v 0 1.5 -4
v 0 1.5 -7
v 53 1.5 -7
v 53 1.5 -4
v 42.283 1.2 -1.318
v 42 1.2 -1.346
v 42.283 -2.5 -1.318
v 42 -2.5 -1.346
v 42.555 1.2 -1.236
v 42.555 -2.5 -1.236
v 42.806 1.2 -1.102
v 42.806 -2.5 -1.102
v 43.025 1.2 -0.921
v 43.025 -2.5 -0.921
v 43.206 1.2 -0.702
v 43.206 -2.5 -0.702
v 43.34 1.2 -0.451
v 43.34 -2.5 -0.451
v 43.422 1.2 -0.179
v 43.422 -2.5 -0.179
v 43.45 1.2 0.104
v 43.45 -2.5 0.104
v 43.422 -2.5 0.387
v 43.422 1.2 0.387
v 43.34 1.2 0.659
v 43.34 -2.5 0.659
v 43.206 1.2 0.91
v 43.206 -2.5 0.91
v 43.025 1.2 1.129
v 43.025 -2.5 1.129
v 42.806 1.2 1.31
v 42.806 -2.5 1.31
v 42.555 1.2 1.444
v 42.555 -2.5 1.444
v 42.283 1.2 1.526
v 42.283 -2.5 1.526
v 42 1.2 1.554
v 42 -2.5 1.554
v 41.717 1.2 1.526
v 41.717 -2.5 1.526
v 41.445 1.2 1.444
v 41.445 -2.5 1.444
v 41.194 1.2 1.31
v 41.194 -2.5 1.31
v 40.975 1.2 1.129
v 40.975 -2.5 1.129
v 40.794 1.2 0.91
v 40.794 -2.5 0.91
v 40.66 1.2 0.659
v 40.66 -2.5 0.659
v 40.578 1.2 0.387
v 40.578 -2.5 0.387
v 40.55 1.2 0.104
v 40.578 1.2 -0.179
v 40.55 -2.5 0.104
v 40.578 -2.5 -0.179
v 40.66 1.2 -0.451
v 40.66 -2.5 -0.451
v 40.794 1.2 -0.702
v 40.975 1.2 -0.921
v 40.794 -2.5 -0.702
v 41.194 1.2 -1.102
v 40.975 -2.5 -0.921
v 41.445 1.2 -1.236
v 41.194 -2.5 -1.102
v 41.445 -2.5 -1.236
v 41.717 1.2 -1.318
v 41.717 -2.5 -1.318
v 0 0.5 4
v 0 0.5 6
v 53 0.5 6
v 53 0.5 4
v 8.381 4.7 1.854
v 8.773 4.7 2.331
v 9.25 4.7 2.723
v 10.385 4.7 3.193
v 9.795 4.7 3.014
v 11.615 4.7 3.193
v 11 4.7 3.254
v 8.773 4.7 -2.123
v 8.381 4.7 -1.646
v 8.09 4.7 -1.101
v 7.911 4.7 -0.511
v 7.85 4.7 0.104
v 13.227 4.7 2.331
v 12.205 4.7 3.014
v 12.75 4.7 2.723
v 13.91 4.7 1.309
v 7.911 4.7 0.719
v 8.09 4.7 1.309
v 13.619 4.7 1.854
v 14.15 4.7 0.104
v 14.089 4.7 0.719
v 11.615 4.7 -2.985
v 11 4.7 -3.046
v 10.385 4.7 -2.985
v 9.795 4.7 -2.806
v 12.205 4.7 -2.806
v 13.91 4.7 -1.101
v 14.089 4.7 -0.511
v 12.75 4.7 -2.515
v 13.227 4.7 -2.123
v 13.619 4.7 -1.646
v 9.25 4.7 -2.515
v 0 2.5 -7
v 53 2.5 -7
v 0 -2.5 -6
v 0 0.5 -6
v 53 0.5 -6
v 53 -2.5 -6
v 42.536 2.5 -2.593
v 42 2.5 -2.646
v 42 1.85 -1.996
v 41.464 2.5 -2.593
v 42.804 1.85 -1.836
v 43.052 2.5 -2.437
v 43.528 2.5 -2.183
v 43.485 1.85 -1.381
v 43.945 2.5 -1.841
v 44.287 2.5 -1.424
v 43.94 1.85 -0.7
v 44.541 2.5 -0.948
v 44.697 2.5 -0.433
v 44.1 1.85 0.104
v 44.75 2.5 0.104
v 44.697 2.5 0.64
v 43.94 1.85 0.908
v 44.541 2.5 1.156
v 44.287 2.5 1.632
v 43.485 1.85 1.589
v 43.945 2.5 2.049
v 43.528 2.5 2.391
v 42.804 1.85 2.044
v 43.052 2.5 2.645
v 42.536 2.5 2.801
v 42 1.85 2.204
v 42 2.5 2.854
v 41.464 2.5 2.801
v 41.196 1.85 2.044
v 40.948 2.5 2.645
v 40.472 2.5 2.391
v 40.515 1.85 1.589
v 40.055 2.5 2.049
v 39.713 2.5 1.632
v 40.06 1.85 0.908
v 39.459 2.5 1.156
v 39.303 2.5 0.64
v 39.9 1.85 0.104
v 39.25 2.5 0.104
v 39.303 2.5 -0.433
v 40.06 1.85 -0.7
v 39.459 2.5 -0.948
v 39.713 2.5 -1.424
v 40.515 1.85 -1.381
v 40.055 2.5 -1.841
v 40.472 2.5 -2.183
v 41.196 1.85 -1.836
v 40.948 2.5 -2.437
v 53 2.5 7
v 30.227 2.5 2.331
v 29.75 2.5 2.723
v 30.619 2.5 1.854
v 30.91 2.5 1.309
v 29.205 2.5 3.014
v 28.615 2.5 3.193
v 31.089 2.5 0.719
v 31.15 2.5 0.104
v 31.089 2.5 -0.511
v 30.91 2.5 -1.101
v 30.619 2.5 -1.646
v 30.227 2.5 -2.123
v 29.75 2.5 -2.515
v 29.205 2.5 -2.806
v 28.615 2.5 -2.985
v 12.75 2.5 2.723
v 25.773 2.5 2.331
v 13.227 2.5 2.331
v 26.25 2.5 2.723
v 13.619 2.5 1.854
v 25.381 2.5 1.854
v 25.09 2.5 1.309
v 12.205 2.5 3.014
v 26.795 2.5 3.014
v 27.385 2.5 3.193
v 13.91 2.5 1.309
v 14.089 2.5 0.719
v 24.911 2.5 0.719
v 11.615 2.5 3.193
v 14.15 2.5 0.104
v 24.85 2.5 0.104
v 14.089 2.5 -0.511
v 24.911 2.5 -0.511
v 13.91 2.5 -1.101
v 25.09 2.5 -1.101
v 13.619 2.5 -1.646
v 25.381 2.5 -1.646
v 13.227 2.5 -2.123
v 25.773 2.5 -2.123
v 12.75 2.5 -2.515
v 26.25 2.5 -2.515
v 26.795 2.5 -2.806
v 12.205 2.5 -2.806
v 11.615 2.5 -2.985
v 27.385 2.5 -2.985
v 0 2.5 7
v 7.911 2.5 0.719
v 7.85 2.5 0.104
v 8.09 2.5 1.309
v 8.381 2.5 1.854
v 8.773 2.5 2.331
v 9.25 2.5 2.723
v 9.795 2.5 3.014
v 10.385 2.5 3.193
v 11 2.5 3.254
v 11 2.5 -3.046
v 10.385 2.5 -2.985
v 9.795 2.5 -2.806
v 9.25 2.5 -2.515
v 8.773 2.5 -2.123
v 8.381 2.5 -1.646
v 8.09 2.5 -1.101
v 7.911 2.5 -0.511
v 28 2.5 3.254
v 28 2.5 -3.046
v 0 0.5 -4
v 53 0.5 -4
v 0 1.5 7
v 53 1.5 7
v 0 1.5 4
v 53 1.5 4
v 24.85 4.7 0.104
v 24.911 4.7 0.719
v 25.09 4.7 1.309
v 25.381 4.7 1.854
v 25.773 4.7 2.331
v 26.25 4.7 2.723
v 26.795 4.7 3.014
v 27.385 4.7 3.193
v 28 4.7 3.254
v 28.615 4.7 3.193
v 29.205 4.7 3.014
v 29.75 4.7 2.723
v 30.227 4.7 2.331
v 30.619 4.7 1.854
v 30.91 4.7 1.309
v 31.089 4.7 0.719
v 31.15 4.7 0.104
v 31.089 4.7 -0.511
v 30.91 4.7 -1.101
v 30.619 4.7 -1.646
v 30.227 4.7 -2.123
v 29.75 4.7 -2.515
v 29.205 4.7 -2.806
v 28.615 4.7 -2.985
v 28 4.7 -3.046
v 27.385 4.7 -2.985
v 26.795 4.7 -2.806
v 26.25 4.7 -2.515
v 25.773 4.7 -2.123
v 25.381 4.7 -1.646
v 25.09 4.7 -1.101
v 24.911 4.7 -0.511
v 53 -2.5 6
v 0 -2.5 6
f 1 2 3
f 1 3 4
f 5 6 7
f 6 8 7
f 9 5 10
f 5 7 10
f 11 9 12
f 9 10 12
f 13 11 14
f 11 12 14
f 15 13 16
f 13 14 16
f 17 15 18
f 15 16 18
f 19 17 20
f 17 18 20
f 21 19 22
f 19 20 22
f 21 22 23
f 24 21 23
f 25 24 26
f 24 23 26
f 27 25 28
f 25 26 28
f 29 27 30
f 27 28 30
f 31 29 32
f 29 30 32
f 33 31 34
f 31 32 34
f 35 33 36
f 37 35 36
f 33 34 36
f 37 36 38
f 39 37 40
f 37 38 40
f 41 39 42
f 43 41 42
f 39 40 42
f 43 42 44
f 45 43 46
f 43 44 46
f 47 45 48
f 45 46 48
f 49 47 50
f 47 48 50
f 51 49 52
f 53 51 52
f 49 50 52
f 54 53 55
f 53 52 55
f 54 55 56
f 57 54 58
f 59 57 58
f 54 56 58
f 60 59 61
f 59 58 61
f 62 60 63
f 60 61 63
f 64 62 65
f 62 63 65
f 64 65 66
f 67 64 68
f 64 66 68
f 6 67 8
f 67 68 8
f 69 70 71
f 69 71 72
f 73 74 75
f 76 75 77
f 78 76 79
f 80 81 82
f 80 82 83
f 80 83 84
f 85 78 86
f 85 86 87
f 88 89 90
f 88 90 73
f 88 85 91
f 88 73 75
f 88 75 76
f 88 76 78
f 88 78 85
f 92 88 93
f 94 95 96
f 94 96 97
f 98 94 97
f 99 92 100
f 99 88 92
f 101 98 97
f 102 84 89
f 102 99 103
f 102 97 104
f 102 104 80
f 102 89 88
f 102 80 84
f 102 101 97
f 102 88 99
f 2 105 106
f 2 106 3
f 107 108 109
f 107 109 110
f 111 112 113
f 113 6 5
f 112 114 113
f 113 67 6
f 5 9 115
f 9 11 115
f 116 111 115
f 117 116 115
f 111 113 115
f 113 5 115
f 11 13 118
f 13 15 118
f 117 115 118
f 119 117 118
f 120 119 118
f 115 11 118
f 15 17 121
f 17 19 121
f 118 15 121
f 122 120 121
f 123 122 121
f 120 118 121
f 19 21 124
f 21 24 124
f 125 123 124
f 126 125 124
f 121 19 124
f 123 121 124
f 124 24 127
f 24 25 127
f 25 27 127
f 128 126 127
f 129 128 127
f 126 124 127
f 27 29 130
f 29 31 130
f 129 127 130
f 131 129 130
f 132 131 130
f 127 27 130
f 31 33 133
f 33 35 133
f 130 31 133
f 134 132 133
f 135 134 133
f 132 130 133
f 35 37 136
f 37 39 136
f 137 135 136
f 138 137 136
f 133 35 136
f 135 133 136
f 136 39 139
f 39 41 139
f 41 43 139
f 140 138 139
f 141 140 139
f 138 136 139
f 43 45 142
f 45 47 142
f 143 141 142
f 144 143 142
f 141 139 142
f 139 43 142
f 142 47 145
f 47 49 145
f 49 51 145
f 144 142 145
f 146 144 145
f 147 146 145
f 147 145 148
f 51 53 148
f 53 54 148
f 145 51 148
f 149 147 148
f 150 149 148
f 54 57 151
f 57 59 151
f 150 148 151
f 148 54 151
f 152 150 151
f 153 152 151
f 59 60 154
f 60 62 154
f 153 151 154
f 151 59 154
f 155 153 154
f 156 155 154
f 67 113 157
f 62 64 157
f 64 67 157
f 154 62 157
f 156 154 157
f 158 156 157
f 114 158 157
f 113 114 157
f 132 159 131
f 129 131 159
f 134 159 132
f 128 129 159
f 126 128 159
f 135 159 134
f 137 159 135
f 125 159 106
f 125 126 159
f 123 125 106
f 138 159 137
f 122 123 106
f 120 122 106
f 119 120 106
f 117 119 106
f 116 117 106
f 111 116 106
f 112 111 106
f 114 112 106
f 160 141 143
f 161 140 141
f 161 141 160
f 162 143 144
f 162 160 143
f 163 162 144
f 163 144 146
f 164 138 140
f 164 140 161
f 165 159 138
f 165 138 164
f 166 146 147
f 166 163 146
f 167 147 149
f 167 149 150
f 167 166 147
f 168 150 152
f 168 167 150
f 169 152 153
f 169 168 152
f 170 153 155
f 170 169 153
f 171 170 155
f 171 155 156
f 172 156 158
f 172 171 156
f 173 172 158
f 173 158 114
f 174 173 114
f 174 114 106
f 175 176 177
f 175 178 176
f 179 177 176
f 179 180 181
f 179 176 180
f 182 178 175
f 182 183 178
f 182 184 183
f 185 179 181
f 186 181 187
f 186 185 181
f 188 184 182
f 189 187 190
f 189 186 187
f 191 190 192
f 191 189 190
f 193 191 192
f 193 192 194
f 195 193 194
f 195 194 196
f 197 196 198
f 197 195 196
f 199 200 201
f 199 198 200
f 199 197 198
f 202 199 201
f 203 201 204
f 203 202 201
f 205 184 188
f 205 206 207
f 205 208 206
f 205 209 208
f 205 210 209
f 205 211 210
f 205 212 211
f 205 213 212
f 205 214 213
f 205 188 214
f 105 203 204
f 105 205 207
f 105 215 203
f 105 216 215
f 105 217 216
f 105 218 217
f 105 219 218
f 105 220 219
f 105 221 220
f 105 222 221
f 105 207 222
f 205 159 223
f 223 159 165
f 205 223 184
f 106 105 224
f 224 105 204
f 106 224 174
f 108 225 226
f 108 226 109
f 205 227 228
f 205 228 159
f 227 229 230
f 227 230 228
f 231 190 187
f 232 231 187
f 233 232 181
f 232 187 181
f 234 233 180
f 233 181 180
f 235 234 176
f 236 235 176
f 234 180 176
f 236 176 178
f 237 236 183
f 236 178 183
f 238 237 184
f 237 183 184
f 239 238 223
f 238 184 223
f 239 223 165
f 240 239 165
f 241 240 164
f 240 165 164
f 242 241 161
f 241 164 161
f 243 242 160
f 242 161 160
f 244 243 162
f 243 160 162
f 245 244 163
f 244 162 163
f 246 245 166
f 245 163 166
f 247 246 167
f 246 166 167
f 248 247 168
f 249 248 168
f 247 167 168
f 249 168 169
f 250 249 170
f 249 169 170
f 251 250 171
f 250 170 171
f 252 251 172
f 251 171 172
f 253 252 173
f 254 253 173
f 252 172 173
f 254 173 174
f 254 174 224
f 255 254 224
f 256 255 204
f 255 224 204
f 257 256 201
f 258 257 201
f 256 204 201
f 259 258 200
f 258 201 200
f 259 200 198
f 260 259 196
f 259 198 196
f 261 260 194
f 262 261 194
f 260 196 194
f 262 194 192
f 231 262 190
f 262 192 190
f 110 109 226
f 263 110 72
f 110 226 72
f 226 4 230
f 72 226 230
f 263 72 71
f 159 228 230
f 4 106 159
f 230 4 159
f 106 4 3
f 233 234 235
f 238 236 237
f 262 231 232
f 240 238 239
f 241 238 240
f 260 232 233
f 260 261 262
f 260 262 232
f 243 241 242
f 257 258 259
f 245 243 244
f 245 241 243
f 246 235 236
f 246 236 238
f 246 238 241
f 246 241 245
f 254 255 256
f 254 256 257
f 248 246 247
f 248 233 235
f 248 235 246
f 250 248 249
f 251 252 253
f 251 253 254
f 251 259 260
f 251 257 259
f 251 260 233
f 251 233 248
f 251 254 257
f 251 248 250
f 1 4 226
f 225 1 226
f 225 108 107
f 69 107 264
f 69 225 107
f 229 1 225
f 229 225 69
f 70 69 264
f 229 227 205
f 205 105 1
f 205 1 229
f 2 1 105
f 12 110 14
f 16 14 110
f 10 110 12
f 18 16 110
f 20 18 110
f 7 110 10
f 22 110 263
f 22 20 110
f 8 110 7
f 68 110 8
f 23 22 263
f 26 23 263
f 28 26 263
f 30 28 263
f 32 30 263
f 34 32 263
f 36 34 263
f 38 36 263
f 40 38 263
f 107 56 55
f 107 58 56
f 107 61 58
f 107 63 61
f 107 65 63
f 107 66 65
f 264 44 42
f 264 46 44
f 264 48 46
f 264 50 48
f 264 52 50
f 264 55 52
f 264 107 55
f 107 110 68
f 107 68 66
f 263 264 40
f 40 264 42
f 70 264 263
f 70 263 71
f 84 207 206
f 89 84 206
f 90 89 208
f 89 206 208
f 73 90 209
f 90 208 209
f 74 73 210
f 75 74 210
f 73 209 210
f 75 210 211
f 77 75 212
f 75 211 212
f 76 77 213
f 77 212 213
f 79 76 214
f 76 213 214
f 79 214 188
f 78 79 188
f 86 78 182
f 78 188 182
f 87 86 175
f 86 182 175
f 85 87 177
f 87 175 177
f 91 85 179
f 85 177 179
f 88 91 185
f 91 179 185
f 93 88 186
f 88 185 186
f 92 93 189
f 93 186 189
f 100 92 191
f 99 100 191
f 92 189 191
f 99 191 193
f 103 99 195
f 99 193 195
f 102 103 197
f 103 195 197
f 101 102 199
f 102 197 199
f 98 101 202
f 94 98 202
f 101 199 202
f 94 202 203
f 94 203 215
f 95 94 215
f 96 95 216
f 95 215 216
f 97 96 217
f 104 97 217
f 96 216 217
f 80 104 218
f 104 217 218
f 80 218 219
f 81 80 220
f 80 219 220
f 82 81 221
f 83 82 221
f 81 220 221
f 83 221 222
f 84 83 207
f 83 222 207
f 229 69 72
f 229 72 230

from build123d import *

# Parameters (mm, degrees)
BOSS_EXTRUDE1_DEPTH                                  = 53
CSK_FOR_M2_5_COUNTERSUNK_FLAT_HEAD_SCREW_D           = 2.9
CSK_FOR_M2_5_COUNTERSUNK_FLAT_HEAD_SCREW_DEPTH       = 14
CSK_FOR_M2_5_COUNTERSUNK_FLAT_HEAD_SCREW_CSINK_D     = 5.5
CSK_FOR_M2_5_COUNTERSUNK_FLAT_HEAD_SCREW_CSINK_ANGLE = 90
CSK_FOR_M2_5_COUNTERSUNK_FLAT_HEAD_SCREW_TIP         = 0.871247898
BOSS_EXTRUDE2_DEPTH                                  = 2.2


with BuildPart() as part:
    # Sketch1 → Boss-Extrude1 (new body)
    with BuildSketch(Plane(origin=(0, 0, 0), x_dir=(0, 0, -1), z_dir=(1, 0, 0))):
        Polygon((4, 0.5), (6, 0.5), (6, -2.5), (-6, -2.5), (-6, 0.5), (-4, 0.5), (-4, 1.5), (-7, 1.5), (-7, 2.5), (7, 2.5), (7, 1.5), (4, 1.5), align=None)
    extrude(amount=BOSS_EXTRUDE1_DEPTH)

    # CSK for M2.5 Countersunk Flat Head Screw1
    with Locations(Plane(origin=(42, 2.5, 0.10398467), x_dir=(0, 0, 1), z_dir=(0, 1, 0))):
        with Locations((0, 0)):
            CounterSinkHole(CSK_FOR_M2_5_COUNTERSUNK_FLAT_HEAD_SCREW_D / 2, CSK_FOR_M2_5_COUNTERSUNK_FLAT_HEAD_SCREW_CSINK_D / 2, depth=CSK_FOR_M2_5_COUNTERSUNK_FLAT_HEAD_SCREW_DEPTH, counter_sink_angle=CSK_FOR_M2_5_COUNTERSUNK_FLAT_HEAD_SCREW_CSINK_ANGLE)
            with Locations((0, 0, -(CSK_FOR_M2_5_COUNTERSUNK_FLAT_HEAD_SCREW_DEPTH + CSK_FOR_M2_5_COUNTERSUNK_FLAT_HEAD_SCREW_TIP / 2))):  # 118° drill point
                Cone(0, CSK_FOR_M2_5_COUNTERSUNK_FLAT_HEAD_SCREW_D / 2, CSK_FOR_M2_5_COUNTERSUNK_FLAT_HEAD_SCREW_TIP, mode=Mode.SUBTRACT)

    # Sketch2 → Boss-Extrude2 (add)
    with BuildSketch(Plane(origin=(0, 2.5, 0), x_dir=(1, 0, 0), z_dir=(0, 1, 0))):
        with BuildLine():
            ThreePointArc((14.15, -0.10398467), (11, 3.04601533), (7.85, -0.10398467))
            ThreePointArc((7.85, -0.10398467), (11, -3.25398467), (14.15, -0.10398467))
        make_face()
        with BuildLine():
            ThreePointArc((31.15, -0.10398467), (28, 3.04601533), (24.85, -0.10398467))
            ThreePointArc((24.85, -0.10398467), (28, -3.25398467), (31.15, -0.10398467))
        make_face()
    extrude(amount=BOSS_EXTRUDE2_DEPTH)


solid = part.part
